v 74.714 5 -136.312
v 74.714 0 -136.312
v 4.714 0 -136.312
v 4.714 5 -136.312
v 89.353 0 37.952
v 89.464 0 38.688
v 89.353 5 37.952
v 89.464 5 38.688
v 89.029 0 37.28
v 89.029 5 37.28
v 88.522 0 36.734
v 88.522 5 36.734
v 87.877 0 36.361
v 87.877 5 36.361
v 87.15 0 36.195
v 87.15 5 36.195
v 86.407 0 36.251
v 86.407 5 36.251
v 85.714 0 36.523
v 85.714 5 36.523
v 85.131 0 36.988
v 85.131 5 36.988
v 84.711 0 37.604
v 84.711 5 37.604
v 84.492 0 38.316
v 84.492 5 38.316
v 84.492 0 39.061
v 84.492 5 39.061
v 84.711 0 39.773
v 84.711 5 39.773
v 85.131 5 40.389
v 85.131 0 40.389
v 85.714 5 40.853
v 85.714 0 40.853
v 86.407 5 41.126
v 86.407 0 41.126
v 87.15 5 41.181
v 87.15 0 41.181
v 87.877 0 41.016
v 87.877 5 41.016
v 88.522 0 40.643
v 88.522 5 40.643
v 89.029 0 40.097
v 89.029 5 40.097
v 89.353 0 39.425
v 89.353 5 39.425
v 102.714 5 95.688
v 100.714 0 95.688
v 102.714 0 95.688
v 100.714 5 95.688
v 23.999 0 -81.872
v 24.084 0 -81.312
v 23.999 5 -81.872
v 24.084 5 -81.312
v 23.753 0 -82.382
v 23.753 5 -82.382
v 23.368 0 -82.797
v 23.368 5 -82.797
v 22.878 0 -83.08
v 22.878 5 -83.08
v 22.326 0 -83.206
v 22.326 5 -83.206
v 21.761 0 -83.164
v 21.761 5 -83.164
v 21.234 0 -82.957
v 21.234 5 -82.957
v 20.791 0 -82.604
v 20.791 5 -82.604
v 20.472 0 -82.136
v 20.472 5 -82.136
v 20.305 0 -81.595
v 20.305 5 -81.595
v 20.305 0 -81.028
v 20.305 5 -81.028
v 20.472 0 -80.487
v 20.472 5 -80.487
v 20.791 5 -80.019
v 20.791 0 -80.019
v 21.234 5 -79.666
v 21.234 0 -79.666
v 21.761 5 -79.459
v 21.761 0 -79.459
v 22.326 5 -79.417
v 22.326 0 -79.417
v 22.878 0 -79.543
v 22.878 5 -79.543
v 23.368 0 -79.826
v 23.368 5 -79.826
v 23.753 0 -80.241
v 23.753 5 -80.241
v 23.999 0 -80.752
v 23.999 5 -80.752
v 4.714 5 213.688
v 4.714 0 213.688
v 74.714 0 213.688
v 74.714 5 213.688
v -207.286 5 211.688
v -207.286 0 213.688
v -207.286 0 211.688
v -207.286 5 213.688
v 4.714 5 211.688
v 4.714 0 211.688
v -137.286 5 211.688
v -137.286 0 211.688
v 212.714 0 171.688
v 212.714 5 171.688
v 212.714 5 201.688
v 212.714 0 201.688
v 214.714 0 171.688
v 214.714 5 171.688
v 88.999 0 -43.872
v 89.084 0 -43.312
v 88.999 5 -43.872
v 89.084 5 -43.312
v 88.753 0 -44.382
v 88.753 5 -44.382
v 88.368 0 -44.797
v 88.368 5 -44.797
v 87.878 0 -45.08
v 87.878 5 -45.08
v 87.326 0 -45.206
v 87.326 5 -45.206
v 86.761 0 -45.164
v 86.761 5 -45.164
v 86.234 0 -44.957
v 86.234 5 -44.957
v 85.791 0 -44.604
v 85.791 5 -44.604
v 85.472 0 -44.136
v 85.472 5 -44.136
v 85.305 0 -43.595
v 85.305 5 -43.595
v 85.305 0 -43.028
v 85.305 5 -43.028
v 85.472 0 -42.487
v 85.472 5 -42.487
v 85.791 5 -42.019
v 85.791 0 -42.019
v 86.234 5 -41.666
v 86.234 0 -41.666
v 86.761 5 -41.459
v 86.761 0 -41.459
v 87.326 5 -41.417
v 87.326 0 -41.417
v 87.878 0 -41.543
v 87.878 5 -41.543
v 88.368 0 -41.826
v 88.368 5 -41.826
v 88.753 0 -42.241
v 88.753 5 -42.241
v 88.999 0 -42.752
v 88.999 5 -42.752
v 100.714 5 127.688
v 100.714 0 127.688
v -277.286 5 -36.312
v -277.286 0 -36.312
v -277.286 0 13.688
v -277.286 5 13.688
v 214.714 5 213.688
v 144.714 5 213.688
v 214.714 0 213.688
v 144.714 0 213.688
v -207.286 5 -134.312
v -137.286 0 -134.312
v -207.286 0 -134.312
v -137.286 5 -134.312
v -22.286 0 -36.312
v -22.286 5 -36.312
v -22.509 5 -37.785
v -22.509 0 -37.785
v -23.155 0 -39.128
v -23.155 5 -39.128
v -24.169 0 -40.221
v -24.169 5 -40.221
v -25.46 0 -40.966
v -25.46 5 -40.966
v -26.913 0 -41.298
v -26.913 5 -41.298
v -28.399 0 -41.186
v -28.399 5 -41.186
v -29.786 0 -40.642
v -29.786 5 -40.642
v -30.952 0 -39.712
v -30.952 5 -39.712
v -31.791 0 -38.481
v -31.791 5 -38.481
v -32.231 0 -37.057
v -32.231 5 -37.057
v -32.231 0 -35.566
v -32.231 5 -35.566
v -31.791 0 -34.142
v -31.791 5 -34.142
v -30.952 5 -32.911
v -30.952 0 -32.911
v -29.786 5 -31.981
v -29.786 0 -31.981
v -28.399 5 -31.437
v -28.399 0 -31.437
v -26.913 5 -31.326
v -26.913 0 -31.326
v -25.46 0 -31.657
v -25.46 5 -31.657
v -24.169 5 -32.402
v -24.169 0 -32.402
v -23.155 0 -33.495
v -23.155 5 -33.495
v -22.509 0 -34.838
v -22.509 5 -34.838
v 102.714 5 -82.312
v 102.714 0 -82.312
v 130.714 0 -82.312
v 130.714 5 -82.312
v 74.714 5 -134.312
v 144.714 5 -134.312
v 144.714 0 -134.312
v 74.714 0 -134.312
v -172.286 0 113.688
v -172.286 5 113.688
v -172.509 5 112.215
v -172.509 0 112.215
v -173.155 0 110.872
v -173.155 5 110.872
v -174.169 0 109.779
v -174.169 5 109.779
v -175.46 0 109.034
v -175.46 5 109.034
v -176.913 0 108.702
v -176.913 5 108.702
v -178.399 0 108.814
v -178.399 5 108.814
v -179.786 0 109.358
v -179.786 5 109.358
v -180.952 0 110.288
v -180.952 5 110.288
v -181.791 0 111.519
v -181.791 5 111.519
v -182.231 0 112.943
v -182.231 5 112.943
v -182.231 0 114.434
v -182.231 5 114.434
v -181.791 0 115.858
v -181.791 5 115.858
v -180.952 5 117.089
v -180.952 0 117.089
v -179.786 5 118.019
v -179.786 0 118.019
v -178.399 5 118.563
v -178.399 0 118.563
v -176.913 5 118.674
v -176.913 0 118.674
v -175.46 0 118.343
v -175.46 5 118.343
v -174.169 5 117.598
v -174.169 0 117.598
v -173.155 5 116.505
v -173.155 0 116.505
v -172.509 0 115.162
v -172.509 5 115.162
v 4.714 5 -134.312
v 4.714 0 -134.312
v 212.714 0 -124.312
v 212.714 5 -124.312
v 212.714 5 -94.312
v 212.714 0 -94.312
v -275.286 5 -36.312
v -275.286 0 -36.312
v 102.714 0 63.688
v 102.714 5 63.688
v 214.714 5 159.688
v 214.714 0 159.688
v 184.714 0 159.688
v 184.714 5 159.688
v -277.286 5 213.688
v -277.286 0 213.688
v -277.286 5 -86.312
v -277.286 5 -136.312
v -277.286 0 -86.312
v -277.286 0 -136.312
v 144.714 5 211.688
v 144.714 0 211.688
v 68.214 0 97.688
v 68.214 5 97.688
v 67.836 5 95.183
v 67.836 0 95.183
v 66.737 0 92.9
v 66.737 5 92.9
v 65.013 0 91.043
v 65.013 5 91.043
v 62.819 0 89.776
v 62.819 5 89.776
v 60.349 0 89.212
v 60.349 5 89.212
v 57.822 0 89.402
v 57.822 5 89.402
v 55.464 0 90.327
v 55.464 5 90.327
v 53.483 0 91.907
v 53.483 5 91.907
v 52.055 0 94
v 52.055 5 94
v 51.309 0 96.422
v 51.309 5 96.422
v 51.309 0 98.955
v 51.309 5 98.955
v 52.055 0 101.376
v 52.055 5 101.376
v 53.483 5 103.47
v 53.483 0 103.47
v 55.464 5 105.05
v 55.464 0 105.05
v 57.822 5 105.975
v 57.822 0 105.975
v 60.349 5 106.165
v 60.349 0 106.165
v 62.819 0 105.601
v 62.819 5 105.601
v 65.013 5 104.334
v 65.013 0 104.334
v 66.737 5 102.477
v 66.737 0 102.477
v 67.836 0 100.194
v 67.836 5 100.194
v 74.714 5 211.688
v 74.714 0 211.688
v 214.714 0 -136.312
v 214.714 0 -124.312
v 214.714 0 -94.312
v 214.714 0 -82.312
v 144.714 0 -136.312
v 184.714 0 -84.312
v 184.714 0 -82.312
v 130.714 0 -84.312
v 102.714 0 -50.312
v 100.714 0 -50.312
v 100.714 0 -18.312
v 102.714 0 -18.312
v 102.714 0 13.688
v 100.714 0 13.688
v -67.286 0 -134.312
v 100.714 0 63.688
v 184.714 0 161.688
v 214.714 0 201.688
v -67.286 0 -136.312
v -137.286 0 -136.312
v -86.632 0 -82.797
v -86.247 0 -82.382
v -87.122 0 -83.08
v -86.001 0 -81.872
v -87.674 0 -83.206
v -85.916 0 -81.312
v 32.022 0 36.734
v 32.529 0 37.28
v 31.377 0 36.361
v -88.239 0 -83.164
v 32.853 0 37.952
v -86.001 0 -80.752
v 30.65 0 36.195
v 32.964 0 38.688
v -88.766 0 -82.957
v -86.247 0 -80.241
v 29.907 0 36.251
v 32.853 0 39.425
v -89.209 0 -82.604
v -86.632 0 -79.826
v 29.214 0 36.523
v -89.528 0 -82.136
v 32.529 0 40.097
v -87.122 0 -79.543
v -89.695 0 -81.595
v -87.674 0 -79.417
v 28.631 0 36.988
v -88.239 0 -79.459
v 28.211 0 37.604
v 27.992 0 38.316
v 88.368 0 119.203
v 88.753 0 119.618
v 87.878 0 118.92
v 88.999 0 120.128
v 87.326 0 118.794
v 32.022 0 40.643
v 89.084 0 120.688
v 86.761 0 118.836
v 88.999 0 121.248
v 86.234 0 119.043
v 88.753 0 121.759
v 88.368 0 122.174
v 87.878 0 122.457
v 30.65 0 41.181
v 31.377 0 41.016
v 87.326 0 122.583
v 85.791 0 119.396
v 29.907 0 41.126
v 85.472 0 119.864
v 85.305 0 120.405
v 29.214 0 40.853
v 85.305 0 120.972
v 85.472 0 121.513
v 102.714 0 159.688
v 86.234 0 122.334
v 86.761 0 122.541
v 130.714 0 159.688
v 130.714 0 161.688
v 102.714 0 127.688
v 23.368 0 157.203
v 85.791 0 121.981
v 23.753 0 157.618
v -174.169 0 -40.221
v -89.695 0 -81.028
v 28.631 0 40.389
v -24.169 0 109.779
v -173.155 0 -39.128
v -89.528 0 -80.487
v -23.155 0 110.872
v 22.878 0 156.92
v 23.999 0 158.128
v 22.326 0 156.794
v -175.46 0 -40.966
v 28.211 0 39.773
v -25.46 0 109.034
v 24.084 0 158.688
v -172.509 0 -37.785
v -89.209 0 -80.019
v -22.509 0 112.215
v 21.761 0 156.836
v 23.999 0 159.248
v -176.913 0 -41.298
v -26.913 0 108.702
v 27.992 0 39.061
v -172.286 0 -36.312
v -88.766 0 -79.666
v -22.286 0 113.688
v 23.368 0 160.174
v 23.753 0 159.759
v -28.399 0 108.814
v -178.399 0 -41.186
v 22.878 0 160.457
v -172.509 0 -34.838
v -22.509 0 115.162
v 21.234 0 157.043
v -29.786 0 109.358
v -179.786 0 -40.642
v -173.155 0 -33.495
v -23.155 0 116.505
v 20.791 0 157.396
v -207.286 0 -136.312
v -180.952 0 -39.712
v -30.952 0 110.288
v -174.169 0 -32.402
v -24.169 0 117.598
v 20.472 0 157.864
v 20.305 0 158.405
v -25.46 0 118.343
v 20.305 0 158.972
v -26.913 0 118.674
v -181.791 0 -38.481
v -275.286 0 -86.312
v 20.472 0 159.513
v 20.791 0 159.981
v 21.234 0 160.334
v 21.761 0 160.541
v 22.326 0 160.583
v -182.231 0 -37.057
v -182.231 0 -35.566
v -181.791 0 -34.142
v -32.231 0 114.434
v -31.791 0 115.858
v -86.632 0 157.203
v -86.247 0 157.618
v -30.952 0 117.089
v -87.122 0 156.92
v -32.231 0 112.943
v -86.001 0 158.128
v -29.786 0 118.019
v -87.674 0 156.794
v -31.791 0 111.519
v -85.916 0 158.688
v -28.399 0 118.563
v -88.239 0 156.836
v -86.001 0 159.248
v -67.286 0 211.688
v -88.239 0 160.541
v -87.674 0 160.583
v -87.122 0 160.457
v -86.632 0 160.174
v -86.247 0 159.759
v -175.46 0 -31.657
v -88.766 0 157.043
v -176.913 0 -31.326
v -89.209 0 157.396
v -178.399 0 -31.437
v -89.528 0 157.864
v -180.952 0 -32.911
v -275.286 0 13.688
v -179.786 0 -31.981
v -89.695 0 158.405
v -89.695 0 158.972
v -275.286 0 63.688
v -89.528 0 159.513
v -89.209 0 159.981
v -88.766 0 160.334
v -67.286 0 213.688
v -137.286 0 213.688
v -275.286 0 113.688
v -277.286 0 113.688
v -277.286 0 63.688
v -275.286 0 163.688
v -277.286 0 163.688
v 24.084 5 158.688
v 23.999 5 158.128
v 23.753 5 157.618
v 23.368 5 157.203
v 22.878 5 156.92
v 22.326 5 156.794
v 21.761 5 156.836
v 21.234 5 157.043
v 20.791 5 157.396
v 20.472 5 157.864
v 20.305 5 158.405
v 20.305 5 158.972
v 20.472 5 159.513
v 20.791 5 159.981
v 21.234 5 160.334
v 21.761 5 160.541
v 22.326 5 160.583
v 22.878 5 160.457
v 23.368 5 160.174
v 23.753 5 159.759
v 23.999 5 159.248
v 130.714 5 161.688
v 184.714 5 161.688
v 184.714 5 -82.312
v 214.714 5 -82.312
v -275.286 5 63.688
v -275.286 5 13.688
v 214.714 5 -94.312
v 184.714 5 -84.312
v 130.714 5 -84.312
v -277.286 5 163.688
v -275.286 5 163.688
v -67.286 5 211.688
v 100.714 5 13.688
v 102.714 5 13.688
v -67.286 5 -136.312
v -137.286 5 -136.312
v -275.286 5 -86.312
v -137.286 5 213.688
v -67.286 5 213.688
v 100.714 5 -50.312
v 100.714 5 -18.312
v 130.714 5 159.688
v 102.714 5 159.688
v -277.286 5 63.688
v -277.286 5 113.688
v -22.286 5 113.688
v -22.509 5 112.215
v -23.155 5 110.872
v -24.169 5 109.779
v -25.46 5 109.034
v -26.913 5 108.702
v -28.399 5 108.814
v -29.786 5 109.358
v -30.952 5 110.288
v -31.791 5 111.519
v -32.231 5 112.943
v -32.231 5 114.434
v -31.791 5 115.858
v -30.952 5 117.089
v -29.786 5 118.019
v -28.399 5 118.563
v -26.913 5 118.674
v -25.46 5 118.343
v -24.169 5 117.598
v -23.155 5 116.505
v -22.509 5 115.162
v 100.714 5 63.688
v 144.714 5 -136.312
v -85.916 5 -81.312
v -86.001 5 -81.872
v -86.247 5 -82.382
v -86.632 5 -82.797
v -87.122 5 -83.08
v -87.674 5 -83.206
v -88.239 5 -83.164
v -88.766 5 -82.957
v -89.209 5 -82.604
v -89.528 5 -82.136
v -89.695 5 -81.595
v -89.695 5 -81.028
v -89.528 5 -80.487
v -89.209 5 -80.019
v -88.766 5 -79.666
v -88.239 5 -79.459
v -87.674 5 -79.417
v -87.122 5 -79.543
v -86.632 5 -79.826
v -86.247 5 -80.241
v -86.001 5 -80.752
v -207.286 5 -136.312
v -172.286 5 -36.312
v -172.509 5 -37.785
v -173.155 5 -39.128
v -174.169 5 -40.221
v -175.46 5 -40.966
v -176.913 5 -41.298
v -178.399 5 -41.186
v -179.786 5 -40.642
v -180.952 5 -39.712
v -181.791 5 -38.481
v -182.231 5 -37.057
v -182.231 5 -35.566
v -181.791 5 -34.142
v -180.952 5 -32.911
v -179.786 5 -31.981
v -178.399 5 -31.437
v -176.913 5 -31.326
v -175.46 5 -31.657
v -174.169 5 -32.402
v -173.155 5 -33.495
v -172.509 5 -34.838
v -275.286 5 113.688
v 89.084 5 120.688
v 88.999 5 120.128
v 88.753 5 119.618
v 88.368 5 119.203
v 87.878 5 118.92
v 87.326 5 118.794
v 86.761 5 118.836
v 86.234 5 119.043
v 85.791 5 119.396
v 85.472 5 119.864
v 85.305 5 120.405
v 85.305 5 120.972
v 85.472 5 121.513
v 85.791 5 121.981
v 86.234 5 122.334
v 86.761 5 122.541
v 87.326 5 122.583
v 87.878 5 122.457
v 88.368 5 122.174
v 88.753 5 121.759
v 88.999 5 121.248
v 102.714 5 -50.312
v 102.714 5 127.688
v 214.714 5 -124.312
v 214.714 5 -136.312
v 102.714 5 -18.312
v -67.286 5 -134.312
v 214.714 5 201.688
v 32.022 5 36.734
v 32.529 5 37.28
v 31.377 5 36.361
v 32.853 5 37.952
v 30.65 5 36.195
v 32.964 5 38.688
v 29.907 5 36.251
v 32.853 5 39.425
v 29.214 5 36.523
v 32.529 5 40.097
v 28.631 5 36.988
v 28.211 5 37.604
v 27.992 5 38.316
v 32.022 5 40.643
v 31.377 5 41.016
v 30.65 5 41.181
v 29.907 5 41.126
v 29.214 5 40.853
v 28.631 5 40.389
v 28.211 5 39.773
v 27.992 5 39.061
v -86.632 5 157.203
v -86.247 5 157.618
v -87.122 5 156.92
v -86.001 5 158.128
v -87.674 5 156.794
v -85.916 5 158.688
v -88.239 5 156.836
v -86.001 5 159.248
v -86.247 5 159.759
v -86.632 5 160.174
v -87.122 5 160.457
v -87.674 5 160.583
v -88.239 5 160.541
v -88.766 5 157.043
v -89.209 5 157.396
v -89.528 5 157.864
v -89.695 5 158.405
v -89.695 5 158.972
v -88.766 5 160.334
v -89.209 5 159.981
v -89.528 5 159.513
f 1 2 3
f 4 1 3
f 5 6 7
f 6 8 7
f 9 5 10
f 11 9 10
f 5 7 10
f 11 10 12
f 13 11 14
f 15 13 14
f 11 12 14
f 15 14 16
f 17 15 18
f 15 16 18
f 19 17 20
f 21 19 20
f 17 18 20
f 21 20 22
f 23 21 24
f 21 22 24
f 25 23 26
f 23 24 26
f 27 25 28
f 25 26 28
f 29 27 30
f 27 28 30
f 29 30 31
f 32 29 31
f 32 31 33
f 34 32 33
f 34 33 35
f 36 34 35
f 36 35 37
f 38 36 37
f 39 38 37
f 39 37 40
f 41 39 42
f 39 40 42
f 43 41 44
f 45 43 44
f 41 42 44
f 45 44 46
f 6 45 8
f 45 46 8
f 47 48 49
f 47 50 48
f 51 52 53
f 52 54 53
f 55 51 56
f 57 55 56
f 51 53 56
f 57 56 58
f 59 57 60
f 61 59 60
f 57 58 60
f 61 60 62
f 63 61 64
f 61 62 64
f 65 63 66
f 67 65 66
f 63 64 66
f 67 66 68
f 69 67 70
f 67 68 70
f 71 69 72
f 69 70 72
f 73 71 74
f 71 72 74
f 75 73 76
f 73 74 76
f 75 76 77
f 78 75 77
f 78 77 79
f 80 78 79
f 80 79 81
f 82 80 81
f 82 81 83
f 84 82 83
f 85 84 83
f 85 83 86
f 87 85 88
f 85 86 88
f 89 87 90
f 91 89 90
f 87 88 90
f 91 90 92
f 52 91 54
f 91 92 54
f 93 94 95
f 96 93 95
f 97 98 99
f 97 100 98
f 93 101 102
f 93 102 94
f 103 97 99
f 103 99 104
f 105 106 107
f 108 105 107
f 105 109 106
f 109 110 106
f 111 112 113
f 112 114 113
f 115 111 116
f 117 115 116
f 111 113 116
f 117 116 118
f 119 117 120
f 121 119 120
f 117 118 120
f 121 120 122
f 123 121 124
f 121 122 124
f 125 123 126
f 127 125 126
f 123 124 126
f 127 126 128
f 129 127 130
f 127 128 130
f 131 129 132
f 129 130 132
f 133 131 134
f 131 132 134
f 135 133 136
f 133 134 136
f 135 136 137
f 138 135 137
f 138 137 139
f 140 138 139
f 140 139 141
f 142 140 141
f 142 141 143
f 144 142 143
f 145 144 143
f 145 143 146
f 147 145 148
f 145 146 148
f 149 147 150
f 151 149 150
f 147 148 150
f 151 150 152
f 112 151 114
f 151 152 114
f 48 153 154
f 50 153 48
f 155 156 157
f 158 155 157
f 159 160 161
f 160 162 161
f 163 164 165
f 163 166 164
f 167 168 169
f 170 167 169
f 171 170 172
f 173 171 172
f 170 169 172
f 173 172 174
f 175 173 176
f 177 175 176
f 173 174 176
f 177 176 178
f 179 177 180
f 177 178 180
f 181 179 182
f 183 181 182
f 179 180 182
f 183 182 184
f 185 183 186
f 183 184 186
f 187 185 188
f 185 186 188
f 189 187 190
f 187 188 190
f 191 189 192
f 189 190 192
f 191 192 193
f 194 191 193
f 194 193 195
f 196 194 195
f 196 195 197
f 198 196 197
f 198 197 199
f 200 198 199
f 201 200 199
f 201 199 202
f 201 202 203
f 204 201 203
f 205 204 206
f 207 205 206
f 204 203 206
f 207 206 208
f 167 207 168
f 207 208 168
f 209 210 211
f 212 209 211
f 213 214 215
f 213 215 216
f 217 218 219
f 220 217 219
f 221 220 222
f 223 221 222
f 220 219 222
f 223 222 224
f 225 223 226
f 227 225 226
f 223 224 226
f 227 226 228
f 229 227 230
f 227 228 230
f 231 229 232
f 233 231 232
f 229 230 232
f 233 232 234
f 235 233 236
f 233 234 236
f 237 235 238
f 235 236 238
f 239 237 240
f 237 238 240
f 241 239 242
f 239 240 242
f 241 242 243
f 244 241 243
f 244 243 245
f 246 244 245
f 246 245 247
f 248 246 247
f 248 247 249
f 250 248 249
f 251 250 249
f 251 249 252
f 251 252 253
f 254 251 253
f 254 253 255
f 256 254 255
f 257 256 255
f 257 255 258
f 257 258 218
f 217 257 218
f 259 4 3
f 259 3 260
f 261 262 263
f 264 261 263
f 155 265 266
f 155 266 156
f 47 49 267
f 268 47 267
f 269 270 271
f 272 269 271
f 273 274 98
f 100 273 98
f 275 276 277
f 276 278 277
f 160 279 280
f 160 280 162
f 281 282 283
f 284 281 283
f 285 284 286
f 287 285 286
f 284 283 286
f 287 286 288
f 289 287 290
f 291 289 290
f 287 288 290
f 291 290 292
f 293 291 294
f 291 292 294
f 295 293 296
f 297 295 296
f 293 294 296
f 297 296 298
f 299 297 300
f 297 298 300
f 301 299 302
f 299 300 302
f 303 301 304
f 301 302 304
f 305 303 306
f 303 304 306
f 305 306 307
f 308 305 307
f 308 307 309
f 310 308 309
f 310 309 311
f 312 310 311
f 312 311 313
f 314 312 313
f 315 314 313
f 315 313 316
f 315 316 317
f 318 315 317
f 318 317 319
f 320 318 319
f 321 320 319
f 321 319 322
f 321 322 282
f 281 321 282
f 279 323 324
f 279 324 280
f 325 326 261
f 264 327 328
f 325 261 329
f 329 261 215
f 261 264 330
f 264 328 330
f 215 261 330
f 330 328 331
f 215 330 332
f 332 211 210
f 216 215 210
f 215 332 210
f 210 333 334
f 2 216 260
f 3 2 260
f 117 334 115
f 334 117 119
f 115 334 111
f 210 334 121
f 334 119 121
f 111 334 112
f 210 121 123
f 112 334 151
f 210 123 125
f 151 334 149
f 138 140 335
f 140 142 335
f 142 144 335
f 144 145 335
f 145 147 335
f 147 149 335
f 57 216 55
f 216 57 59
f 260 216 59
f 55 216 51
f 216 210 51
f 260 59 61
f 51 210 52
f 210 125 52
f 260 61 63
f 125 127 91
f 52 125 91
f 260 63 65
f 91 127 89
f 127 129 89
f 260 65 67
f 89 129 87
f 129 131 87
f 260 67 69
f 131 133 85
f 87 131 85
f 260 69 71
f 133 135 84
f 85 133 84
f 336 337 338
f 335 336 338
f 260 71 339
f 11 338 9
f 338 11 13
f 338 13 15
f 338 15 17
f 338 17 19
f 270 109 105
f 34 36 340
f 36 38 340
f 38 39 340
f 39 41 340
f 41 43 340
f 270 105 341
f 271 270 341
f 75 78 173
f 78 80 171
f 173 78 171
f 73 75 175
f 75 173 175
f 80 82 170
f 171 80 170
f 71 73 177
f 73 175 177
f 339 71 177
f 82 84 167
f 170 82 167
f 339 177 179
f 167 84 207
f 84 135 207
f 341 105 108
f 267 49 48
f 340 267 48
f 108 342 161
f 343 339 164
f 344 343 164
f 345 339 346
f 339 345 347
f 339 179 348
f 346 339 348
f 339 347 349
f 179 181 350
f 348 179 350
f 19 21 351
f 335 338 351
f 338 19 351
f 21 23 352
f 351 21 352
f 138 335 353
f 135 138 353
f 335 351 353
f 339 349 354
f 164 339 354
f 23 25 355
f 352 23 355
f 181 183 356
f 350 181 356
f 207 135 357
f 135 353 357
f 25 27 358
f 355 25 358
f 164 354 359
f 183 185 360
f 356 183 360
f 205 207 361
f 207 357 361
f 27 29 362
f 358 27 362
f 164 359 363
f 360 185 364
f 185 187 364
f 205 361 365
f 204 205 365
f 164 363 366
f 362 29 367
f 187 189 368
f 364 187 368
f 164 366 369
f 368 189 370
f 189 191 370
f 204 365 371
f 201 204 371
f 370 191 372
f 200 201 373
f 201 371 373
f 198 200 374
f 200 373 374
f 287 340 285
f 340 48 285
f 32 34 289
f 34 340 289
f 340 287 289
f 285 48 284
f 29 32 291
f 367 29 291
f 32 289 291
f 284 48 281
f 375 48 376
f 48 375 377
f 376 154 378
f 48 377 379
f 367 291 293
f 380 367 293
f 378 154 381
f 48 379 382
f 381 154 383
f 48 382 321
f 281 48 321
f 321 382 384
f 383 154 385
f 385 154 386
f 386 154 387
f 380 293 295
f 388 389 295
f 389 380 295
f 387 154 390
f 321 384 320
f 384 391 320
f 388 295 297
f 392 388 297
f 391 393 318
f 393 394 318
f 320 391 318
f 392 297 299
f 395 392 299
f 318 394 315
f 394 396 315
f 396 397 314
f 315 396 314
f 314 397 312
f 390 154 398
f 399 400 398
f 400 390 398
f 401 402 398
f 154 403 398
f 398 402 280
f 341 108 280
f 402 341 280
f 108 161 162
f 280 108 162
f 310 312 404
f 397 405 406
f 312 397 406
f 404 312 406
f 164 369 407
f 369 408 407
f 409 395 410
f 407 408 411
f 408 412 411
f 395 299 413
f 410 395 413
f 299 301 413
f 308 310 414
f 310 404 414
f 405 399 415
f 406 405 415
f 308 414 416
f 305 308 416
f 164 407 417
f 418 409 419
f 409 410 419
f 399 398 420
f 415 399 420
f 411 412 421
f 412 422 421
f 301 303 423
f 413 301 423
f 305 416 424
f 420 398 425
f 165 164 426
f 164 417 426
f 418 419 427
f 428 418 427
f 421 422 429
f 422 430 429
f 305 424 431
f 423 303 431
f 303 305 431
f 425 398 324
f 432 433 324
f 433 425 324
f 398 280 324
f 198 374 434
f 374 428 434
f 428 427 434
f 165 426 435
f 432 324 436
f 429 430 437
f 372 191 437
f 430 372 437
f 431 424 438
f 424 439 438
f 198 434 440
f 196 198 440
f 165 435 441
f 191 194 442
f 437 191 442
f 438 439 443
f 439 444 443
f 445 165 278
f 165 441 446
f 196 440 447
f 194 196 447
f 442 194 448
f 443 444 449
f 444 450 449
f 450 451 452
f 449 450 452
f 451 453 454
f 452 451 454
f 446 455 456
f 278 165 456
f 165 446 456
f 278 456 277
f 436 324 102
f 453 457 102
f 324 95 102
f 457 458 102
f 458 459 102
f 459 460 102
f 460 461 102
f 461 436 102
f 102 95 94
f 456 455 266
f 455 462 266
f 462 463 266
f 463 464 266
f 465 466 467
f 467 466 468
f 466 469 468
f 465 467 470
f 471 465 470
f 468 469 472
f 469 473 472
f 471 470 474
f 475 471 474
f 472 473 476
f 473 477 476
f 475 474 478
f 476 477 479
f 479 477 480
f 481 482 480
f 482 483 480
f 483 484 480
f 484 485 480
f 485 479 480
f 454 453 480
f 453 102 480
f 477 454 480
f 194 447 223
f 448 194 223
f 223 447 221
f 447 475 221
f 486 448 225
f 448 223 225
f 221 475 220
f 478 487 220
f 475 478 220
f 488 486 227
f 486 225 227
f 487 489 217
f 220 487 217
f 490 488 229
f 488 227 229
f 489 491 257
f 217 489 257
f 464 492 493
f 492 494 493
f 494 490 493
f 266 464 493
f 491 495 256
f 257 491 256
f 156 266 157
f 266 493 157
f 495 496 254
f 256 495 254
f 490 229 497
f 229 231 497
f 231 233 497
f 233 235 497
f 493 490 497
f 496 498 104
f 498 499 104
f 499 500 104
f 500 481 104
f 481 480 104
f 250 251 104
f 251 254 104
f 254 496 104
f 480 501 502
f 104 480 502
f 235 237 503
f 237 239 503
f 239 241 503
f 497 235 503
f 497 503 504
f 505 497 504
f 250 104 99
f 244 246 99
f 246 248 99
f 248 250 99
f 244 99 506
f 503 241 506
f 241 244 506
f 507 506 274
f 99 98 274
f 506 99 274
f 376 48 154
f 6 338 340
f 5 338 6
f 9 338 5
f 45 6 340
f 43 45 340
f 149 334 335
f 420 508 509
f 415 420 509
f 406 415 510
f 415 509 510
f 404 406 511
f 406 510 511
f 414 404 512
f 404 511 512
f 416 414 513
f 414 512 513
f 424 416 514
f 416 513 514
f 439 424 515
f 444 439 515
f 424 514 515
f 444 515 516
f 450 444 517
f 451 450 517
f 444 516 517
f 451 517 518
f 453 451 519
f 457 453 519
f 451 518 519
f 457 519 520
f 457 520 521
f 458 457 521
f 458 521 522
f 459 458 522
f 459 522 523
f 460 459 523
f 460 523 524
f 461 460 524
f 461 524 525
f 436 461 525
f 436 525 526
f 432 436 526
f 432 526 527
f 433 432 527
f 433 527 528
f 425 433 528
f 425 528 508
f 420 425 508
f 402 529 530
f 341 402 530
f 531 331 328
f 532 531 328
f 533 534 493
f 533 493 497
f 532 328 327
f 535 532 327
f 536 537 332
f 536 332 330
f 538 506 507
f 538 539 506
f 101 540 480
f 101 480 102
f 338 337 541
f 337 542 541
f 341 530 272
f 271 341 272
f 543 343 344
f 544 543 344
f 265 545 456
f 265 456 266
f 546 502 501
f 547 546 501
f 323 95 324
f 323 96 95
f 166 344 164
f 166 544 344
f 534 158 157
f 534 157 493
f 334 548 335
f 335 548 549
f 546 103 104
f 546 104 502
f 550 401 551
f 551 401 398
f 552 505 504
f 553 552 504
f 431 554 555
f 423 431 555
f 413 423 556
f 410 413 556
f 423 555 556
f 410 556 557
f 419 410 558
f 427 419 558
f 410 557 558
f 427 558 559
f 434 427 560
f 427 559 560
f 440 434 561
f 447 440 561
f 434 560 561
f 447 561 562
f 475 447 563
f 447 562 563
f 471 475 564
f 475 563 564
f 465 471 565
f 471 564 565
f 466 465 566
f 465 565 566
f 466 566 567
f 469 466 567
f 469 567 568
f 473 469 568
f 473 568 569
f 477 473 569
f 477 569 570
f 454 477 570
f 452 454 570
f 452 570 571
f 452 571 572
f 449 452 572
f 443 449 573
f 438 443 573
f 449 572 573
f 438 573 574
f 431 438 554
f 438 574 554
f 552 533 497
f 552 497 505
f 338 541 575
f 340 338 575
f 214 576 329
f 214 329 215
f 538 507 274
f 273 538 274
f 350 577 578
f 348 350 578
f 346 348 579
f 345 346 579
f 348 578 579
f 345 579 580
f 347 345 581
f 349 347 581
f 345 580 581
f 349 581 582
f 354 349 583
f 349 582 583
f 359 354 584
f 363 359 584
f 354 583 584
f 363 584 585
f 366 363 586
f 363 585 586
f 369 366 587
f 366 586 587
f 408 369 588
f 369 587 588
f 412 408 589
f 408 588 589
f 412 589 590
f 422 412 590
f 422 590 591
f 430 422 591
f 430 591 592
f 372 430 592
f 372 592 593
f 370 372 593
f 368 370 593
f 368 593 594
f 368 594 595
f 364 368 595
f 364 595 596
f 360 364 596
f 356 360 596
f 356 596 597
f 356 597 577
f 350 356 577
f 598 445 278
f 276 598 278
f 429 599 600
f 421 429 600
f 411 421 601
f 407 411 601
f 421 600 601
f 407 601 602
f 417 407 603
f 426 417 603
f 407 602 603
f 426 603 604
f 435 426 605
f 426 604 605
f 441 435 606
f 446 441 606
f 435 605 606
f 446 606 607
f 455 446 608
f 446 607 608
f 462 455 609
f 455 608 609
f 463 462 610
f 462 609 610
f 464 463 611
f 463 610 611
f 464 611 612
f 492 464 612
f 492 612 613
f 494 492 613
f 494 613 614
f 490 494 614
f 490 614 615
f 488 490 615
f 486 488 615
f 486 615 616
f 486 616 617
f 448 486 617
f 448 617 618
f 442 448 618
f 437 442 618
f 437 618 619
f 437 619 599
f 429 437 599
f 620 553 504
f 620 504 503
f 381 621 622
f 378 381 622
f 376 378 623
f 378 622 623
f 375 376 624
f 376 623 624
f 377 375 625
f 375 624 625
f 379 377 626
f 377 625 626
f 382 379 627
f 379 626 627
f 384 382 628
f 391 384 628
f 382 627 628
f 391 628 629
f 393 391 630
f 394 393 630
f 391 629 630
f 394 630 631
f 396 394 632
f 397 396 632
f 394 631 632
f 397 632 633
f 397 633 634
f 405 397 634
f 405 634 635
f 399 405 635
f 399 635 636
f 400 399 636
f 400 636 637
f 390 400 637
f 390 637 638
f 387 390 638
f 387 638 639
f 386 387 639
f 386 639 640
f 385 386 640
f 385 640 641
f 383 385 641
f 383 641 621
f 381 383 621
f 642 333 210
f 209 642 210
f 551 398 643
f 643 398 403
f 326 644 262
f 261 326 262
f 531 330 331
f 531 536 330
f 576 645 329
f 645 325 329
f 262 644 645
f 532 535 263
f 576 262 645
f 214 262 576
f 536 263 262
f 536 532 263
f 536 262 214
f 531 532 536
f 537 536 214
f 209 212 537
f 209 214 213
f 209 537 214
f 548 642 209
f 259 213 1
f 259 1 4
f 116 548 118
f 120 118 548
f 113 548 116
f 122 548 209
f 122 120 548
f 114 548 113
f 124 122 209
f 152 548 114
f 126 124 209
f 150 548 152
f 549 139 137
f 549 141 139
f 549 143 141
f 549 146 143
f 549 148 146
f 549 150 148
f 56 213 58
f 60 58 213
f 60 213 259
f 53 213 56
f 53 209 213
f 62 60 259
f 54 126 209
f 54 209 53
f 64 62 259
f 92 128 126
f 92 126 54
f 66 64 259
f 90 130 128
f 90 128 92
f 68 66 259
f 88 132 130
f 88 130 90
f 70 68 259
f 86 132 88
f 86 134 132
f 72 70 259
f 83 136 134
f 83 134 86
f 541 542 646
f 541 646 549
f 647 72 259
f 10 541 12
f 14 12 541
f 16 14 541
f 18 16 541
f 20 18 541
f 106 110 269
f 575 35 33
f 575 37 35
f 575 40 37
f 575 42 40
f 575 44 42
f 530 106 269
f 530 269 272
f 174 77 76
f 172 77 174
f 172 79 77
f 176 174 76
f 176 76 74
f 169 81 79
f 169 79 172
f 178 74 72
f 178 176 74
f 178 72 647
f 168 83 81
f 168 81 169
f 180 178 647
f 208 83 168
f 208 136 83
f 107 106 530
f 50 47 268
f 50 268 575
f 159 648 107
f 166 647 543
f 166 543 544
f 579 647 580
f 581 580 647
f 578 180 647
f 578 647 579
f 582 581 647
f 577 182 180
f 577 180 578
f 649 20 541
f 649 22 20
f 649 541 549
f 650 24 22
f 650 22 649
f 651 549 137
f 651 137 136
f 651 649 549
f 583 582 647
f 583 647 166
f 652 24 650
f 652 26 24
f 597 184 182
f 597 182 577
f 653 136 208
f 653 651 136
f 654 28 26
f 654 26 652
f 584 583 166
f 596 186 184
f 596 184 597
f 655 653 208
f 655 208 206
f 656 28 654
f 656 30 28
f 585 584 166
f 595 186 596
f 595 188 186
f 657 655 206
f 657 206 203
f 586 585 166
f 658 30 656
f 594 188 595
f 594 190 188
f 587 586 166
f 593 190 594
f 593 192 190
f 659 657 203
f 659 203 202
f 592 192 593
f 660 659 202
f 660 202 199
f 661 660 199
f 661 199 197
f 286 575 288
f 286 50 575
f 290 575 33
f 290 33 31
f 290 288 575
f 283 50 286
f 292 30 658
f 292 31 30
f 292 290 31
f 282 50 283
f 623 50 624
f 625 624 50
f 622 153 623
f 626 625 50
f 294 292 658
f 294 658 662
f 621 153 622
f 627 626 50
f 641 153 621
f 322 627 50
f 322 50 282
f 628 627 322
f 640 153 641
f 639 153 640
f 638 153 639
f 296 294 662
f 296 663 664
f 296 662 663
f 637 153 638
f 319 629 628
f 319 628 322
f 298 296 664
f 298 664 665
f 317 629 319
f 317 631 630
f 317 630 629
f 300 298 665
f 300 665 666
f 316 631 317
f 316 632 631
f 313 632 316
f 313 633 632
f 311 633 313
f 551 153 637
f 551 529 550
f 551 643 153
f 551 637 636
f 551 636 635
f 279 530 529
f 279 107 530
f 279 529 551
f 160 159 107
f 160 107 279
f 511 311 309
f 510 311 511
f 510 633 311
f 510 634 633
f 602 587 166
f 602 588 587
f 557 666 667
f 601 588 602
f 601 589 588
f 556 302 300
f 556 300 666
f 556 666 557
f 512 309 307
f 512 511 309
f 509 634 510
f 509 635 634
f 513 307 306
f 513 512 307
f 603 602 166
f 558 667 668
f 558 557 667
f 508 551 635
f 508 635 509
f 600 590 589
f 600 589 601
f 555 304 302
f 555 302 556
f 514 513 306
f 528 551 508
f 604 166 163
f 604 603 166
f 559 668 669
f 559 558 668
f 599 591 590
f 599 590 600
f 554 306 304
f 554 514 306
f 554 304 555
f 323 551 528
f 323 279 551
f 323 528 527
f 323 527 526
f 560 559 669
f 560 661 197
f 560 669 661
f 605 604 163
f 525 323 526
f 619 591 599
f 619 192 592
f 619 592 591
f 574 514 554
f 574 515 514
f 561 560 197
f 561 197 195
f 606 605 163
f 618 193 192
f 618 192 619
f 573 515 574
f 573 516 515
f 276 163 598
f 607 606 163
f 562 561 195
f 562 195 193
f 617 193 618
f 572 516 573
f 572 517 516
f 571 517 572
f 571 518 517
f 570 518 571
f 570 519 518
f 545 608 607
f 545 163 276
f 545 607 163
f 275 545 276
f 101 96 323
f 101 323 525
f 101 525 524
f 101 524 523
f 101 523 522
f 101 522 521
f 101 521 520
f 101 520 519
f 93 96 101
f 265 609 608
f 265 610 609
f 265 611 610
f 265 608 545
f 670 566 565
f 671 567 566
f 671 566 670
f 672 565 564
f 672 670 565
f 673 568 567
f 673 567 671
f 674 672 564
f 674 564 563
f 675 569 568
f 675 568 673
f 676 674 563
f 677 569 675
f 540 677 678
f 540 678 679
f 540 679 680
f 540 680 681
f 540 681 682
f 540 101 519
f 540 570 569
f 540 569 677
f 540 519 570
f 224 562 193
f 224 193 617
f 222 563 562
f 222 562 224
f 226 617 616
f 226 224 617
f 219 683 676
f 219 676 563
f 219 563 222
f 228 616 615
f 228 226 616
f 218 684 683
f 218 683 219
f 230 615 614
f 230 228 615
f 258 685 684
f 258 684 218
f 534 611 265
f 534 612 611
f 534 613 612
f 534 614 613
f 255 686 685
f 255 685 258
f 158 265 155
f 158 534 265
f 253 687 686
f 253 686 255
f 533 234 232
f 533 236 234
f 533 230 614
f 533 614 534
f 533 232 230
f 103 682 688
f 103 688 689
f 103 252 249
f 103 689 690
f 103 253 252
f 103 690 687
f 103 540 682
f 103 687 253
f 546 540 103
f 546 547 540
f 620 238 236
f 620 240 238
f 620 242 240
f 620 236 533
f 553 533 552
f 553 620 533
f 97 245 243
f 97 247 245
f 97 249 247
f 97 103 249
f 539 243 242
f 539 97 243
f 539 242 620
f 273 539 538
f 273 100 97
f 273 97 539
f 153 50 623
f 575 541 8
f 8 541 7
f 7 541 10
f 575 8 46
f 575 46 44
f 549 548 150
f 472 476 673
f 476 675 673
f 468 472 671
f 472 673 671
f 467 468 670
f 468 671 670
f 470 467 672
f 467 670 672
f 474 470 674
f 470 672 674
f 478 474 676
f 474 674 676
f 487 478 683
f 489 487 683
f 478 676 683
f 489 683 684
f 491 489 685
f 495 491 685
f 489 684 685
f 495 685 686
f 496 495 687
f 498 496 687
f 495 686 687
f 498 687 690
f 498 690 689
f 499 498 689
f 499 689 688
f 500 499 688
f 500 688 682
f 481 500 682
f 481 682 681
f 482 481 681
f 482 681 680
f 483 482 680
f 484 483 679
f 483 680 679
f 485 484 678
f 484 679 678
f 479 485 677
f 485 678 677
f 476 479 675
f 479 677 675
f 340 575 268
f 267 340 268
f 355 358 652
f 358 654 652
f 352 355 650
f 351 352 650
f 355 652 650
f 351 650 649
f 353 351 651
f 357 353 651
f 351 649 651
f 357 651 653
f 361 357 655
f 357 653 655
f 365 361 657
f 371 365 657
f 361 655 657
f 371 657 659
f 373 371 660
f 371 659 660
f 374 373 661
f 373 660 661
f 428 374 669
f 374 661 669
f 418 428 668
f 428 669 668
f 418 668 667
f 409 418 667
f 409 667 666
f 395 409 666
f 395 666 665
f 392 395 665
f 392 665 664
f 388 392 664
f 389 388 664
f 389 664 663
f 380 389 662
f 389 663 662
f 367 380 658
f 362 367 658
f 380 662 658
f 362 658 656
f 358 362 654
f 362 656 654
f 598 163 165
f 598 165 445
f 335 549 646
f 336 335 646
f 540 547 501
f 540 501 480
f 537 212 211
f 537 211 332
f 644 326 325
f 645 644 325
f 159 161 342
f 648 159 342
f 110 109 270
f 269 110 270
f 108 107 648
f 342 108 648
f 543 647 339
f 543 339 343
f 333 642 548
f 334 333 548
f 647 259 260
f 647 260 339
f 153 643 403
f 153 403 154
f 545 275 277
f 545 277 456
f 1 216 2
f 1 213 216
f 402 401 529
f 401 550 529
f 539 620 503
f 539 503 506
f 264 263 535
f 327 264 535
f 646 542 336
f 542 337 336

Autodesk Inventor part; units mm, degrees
ref_plane "YZ Plane" through (0, 0, 0) normal (1, 0, 0) x (0, 1, 0)
ref_plane "XZ Plane" through (0, 0, 0) normal (0, 1, 0) x (-1, 0, 0)
sketch "Sketch1" plane through (0, 0, 0) normal (0, 1, 0) x (-1, 0, 0)
  line L0 (277.2864, 213.6884) -> (-214.7136, 213.6884)
  line L1 (-214.7136, -136.3116) -> (277.2864, -136.3116)
  line L2 (277.2864, -136.3116) -> (277.2864, 213.6884)
  line L3 (-214.7136, 159.6884) -> (-102.7136, 159.6884)
  line L4 (-102.7136, 159.6884) -> (-102.7136, -82.3116)
  line L5 (-102.7136, -82.3116) -> (-214.7136, -82.3116)
  line L6 (-214.7136, 213.6884) -> (-214.7136, 159.6884)
  line L7 (-214.7136, -82.3116) -> (-214.7136, -136.3116)
  point P0 (0, 0)
  dimension "d0" = 350
  dimension "d1" = 492
  dimension "d2" = 112
  dimension "d3" = 112
  dimension "d4" = 54
  dimension "d5" = 54
extrude "Extrusion1" add sketch "Sketch1" along normal blind 5
sketch "Sketch2" plane through (0, 5, 0) normal (0, 1, 0) x (1, 0, 0)
  line L0 (214.7136, 136.3116) -> (-277.2864, 136.3116) projected
  line L1 (-207.2864, 136.3116) -> (-137.2864, 136.3116)
  line L2 (-137.2864, 136.3116) -> (-137.2864, 134.3116)
  line L3 (-137.2864, 134.3116) -> (-207.2864, 134.3116)
  line L4 (-207.2864, 134.3116) -> (-207.2864, 136.3116)
  line L5 (-67.2864, 136.3116) -> (4.7136, 136.3116)
  line L6 (4.7136, 136.3116) -> (4.7136, 134.3116)
  line L7 (4.7136, 134.3116) -> (-67.2864, 134.3116)
  line L8 (-67.2864, 134.3116) -> (-67.2864, 136.3116)
  line L9 (74.7136, 136.3116) -> (144.7136, 136.3116)
  line L10 (144.7136, 136.3116) -> (144.7136, 134.3116)
  line L11 (144.7136, 134.3116) -> (74.7136, 134.3116)
  line L12 (74.7136, 134.3116) -> (74.7136, 136.3116)
  line L13 (-277.2864, -213.6884) -> (214.7136, -213.6884) projected
  line L14 (144.7136, -213.6884) -> (74.7136, -213.6884)
  line L15 (74.7136, -213.6884) -> (74.7136, -211.6884)
  line L16 (74.7136, -211.6884) -> (144.7136, -211.6884)
  line L17 (144.7136, -211.6884) -> (144.7136, -213.6884)
  line L18 (4.7136, -213.6884) -> (-67.2864, -213.6884)
  line L19 (-67.2864, -213.6884) -> (-67.2864, -211.6884)
  line L20 (-67.2864, -211.6884) -> (4.7136, -211.6884)
  line L21 (4.7136, -211.6884) -> (4.7136, -213.6884)
  line L22 (-137.2864, -213.6884) -> (-207.2864, -213.6884)
  line L23 (-207.2864, -213.6884) -> (-207.2864, -211.6884)
  line L24 (-207.2864, -211.6884) -> (-137.2864, -211.6884)
  line L25 (-137.2864, -211.6884) -> (-137.2864, -213.6884)
  line L26 (-277.2864, 136.3116) -> (-277.2864, -213.6884) projected
  line L27 (-277.2864, 86.3116) -> (-275.2864, 86.3116)
  line L28 (-275.2864, 86.3116) -> (-275.2864, 36.3116)
  line L29 (-275.2864, 36.3116) -> (-277.2864, 36.3116)
  line L30 (-277.2864, 36.3116) -> (-277.2864, 86.3116)
  line L31 (-277.2864, -13.6884) -> (-275.2864, -13.6884)
  line L32 (-275.2864, -13.6884) -> (-275.2864, -63.6884)
  line L33 (-275.2864, -63.6884) -> (-277.2864, -63.6884)
  line L34 (-277.2864, -63.6884) -> (-277.2864, -13.6884)
  line L35 (-277.2864, -113.6884) -> (-275.2864, -113.6884)
  line L36 (-275.2864, -113.6884) -> (-275.2864, -163.6884)
  line L37 (-275.2864, -163.6884) -> (-277.2864, -163.6884)
  line L38 (-277.2864, -163.6884) -> (-277.2864, -113.6884)
  line L39 (214.7136, 82.3116) -> (214.7136, 136.3116) projected
  line L40 (214.7136, 124.3116) -> (212.7136, 124.3116)
  line L41 (212.7136, 124.3116) -> (212.7136, 94.3116)
  line L42 (212.7136, 94.3116) -> (214.7136, 94.3116)
  line L43 (214.7136, 94.3116) -> (214.7136, 124.3116)
  line L44 (214.7136, -213.6884) -> (214.7136, -159.6884) projected
  line L45 (214.7136, -171.6884) -> (212.7136, -171.6884)
  line L46 (212.7136, -171.6884) -> (212.7136, -201.6884)
  line L47 (212.7136, -201.6884) -> (214.7136, -201.6884)
  line L48 (214.7136, -201.6884) -> (214.7136, -171.6884)
  line L49 (102.7136, 82.3116) -> (214.7136, 82.3116) projected
  line L50 (214.7136, -159.6884) -> (102.7136, -159.6884) projected
  line L51 (184.7136, 82.3116) -> (130.7136, 82.3116)
  line L52 (130.7136, 82.3116) -> (130.7136, 84.3116)
  line L53 (130.7136, 84.3116) -> (184.7136, 84.3116)
  line L54 (184.7136, 84.3116) -> (184.7136, 82.3116)
  line L55 (184.7136, -159.6884) -> (130.7136, -159.6884)
  line L56 (130.7136, -159.6884) -> (130.7136, -161.6884)
  line L57 (130.7136, -161.6884) -> (184.7136, -161.6884)
  line L58 (184.7136, -161.6884) -> (184.7136, -159.6884)
  line L59 (102.7136, -159.6884) -> (102.7136, 82.3116) projected
  line L60 (102.7136, 50.3116) -> (100.7136, 50.3116)
  line L61 (100.7136, 50.3116) -> (100.7136, 18.3116)
  line L62 (100.7136, 18.3116) -> (102.7136, 18.3116)
  line L63 (102.7136, 18.3116) -> (102.7136, 50.3116)
  line L64 (102.7136, -13.6884) -> (100.7136, -13.6884)
  line L65 (100.7136, -13.6884) -> (100.7136, -63.6884)
  line L66 (100.7136, -63.6884) -> (102.7136, -63.6884)
  line L67 (102.7136, -63.6884) -> (102.7136, -13.6884)
  line L68 (102.7136, -127.6884) -> (100.7136, -127.6884)
  line L69 (100.7136, -127.6884) -> (100.7136, -95.6884)
  line L70 (100.7136, -95.6884) -> (102.7136, -95.6884)
  line L71 (102.7136, -95.6884) -> (102.7136, -127.6884)
  point P0 (0, 0)
  point P1 (-207.2864, -213.6884)
  point P2 (130.7136, -159.6884)
  dimension "d8" = 2
  dimension "d9" = 2
  dimension "d10" = 2
  dimension "d11" = 2
  dimension "d12" = 50
  dimension "d13" = 50
  dimension "d14" = 50
  dimension "d15" = 50
  dimension "d16" = 50
  dimension "d17" = 50
  dimension "d18" = 12
  dimension "d19" = 12
  dimension "d20" = 12
  dimension "d21" = 12
  dimension "d22" = 70
  dimension "d23" = 70
  dimension "d24" = 72
  dimension "d25" = 70
  dimension "d26" = 70
  dimension "d27" = 70
  dimension "d28" = 2
  dimension "d29" = 2
  dimension "d30" = 30
  dimension "d32" = 2
  dimension "d33" = 2
  dimension "d34" = 2
  dimension "d35" = 32
  dimension "d36" = 32
  dimension "d37" = 32
  dimension "d39" = 32
  dimension "d40" = 32
  dimension "d41" = 32
  dimension "d42" = 50
  dimension "d45" = 72
  dimension "d46" = 70
  dimension "d47" = 28
  dimension "d48" = 28
  dimension "d49" = 54
  dimension "d50" = 54
  dimension "d51" = 30
extrude "Extrusion2" cut sketch "Sketch2" against normal blind 10 contours L10 L11 L12 L0 | L39 L42 L41 L40 | L6 L7 L8 L0 | L49 L52 L53 L54 | L2 L3 L4 L0 | L59 L62 L61 L60 | L27 L28 L29 L26 | L59 L66 L65 L64 | L31 L32 L33 L26 | L59 L68 L69 L70 | L35 L36 L37 L26 | L50 L58 L57 L56 | L23 L24 L25 L13 | L19 L20 L21 L13 | L44 L47 L46 L45 | L15 L16 L17 L13
sketch "Sketch3" plane through (0, 5, 0) normal (0, 1, 0) x (1, 0, 0)
  circle A0 centre (-177.2864, 36.3116) radius 5
  line L0 (-277.2864, 136.3116) -> (-277.2864, 86.3116) projected
  line L1 (-207.2864, 136.3116) -> (-277.2864, 136.3116) projected
  point P0 (0, 0)
  dimension "d52" = 100
  dimension "d53" = 100
  dimension "d54" = 10
extrude "Extrusion3" cut sketch "Sketch3" against normal blind 10
pattern_linear "Rectangular Pattern1" count 2 spacing 150 along (0, 0, 1) count 2 spacing 150 along (1, 0, 0) of "Extrusion3"
sketch "Sketch5" plane through (0, 5, 0) normal (0, 1, 0) x (1, 0, 0)
  circle A0 centre (87.1836, 43.3116) radius 1.9
  circle A1 centre (22.1836, 81.3116) radius 1.9
  circle A2 centre (-87.8164, 81.3116) radius 1.9
  line L0 (102.7136, 50.3116) -> (102.7136, 82.3116) projected
  line L1 (102.7136, -13.6884) -> (102.7136, 18.3116) projected
  line L2 (-67.2864, 136.3116) -> (-137.2864, 136.3116) projected
  line L3 (74.7136, 136.3116) -> (4.7136, 136.3116) projected
  point P0 (0, 0)
  dimension "d63" = 15.53
  dimension "d64" = 3.8
  dimension "d65" = 80.53
  dimension "d66" = 3.8
  dimension "d67" = 3.8
  dimension "d68" = 190.53
  dimension "d69" = 55
  dimension "d70" = 55
  dimension "d71" = 93
extrude "Extrusion4" cut sketch "Sketch5" against normal blind 10
sketch "Sketch6" plane through (0, 5, 0) normal (0, 1, 0) x (1, 0, 0)
  line L0 (100.7136, -63.6884) -> (100.7136, -13.6884) projected
  line L1 (100.7136, -38.6884) -> (-275.2864, -38.6884)
  line L2 (-275.2864, -63.6884) -> (-275.2864, -13.6884) projected
  point P0 (0, 0)
ref_plane "Work Plane2" through (100.7136, 5, 38.6884) normal (0, 0, 1) x (1, 0, 0)
mirror "Mirror1" about plane through (100.7136, 5, 38.6884) normal (0, 0, 1) of "Extrusion4"
sketch "Sketch8" plane through (0, 5, 0) normal (0, 1, 0) x (1, 0, 0)
  circle A0 centre (86.9636, -38.6884) radius 2.5
  circle A1 centre (30.4636, -38.6884) radius 2.5
  line L0 (130.7136, -159.6884) -> (102.7136, -159.6884) projected
  line L1 (102.7136, -95.6884) -> (102.7136, -63.6884) projected
  point P0 (0, 0)
  point P1 (116.7136, -159.6884)
  dimension "d78" = 5
  dimension "d79" = 121
  dimension "d80" = 121
  dimension "d81" = 15.75
  dimension "d82" = 56.5
  dimension "d83" = 5
extrude "Extrusion5" cut sketch "Sketch8" against normal blind 10
sketch "Sketch9" plane through (0, 5, 0) normal (0, 1, 0) x (1, 0, 0)
  circle A0 centre (59.7136, -97.6884) radius 8.5
  line L0 (4.7136, -213.6884) -> (74.7136, -213.6884) projected
  line L1 (102.7136, -95.6884) -> (102.7136, -63.6884) projected
  point P0 (0, 0)
  dimension "d86" = 17
  dimension "d87" = 116
  dimension "d88" = 43
extrude "Extrusion6" cut sketch "Sketch9" against normal blind 10
properties part number "top"
